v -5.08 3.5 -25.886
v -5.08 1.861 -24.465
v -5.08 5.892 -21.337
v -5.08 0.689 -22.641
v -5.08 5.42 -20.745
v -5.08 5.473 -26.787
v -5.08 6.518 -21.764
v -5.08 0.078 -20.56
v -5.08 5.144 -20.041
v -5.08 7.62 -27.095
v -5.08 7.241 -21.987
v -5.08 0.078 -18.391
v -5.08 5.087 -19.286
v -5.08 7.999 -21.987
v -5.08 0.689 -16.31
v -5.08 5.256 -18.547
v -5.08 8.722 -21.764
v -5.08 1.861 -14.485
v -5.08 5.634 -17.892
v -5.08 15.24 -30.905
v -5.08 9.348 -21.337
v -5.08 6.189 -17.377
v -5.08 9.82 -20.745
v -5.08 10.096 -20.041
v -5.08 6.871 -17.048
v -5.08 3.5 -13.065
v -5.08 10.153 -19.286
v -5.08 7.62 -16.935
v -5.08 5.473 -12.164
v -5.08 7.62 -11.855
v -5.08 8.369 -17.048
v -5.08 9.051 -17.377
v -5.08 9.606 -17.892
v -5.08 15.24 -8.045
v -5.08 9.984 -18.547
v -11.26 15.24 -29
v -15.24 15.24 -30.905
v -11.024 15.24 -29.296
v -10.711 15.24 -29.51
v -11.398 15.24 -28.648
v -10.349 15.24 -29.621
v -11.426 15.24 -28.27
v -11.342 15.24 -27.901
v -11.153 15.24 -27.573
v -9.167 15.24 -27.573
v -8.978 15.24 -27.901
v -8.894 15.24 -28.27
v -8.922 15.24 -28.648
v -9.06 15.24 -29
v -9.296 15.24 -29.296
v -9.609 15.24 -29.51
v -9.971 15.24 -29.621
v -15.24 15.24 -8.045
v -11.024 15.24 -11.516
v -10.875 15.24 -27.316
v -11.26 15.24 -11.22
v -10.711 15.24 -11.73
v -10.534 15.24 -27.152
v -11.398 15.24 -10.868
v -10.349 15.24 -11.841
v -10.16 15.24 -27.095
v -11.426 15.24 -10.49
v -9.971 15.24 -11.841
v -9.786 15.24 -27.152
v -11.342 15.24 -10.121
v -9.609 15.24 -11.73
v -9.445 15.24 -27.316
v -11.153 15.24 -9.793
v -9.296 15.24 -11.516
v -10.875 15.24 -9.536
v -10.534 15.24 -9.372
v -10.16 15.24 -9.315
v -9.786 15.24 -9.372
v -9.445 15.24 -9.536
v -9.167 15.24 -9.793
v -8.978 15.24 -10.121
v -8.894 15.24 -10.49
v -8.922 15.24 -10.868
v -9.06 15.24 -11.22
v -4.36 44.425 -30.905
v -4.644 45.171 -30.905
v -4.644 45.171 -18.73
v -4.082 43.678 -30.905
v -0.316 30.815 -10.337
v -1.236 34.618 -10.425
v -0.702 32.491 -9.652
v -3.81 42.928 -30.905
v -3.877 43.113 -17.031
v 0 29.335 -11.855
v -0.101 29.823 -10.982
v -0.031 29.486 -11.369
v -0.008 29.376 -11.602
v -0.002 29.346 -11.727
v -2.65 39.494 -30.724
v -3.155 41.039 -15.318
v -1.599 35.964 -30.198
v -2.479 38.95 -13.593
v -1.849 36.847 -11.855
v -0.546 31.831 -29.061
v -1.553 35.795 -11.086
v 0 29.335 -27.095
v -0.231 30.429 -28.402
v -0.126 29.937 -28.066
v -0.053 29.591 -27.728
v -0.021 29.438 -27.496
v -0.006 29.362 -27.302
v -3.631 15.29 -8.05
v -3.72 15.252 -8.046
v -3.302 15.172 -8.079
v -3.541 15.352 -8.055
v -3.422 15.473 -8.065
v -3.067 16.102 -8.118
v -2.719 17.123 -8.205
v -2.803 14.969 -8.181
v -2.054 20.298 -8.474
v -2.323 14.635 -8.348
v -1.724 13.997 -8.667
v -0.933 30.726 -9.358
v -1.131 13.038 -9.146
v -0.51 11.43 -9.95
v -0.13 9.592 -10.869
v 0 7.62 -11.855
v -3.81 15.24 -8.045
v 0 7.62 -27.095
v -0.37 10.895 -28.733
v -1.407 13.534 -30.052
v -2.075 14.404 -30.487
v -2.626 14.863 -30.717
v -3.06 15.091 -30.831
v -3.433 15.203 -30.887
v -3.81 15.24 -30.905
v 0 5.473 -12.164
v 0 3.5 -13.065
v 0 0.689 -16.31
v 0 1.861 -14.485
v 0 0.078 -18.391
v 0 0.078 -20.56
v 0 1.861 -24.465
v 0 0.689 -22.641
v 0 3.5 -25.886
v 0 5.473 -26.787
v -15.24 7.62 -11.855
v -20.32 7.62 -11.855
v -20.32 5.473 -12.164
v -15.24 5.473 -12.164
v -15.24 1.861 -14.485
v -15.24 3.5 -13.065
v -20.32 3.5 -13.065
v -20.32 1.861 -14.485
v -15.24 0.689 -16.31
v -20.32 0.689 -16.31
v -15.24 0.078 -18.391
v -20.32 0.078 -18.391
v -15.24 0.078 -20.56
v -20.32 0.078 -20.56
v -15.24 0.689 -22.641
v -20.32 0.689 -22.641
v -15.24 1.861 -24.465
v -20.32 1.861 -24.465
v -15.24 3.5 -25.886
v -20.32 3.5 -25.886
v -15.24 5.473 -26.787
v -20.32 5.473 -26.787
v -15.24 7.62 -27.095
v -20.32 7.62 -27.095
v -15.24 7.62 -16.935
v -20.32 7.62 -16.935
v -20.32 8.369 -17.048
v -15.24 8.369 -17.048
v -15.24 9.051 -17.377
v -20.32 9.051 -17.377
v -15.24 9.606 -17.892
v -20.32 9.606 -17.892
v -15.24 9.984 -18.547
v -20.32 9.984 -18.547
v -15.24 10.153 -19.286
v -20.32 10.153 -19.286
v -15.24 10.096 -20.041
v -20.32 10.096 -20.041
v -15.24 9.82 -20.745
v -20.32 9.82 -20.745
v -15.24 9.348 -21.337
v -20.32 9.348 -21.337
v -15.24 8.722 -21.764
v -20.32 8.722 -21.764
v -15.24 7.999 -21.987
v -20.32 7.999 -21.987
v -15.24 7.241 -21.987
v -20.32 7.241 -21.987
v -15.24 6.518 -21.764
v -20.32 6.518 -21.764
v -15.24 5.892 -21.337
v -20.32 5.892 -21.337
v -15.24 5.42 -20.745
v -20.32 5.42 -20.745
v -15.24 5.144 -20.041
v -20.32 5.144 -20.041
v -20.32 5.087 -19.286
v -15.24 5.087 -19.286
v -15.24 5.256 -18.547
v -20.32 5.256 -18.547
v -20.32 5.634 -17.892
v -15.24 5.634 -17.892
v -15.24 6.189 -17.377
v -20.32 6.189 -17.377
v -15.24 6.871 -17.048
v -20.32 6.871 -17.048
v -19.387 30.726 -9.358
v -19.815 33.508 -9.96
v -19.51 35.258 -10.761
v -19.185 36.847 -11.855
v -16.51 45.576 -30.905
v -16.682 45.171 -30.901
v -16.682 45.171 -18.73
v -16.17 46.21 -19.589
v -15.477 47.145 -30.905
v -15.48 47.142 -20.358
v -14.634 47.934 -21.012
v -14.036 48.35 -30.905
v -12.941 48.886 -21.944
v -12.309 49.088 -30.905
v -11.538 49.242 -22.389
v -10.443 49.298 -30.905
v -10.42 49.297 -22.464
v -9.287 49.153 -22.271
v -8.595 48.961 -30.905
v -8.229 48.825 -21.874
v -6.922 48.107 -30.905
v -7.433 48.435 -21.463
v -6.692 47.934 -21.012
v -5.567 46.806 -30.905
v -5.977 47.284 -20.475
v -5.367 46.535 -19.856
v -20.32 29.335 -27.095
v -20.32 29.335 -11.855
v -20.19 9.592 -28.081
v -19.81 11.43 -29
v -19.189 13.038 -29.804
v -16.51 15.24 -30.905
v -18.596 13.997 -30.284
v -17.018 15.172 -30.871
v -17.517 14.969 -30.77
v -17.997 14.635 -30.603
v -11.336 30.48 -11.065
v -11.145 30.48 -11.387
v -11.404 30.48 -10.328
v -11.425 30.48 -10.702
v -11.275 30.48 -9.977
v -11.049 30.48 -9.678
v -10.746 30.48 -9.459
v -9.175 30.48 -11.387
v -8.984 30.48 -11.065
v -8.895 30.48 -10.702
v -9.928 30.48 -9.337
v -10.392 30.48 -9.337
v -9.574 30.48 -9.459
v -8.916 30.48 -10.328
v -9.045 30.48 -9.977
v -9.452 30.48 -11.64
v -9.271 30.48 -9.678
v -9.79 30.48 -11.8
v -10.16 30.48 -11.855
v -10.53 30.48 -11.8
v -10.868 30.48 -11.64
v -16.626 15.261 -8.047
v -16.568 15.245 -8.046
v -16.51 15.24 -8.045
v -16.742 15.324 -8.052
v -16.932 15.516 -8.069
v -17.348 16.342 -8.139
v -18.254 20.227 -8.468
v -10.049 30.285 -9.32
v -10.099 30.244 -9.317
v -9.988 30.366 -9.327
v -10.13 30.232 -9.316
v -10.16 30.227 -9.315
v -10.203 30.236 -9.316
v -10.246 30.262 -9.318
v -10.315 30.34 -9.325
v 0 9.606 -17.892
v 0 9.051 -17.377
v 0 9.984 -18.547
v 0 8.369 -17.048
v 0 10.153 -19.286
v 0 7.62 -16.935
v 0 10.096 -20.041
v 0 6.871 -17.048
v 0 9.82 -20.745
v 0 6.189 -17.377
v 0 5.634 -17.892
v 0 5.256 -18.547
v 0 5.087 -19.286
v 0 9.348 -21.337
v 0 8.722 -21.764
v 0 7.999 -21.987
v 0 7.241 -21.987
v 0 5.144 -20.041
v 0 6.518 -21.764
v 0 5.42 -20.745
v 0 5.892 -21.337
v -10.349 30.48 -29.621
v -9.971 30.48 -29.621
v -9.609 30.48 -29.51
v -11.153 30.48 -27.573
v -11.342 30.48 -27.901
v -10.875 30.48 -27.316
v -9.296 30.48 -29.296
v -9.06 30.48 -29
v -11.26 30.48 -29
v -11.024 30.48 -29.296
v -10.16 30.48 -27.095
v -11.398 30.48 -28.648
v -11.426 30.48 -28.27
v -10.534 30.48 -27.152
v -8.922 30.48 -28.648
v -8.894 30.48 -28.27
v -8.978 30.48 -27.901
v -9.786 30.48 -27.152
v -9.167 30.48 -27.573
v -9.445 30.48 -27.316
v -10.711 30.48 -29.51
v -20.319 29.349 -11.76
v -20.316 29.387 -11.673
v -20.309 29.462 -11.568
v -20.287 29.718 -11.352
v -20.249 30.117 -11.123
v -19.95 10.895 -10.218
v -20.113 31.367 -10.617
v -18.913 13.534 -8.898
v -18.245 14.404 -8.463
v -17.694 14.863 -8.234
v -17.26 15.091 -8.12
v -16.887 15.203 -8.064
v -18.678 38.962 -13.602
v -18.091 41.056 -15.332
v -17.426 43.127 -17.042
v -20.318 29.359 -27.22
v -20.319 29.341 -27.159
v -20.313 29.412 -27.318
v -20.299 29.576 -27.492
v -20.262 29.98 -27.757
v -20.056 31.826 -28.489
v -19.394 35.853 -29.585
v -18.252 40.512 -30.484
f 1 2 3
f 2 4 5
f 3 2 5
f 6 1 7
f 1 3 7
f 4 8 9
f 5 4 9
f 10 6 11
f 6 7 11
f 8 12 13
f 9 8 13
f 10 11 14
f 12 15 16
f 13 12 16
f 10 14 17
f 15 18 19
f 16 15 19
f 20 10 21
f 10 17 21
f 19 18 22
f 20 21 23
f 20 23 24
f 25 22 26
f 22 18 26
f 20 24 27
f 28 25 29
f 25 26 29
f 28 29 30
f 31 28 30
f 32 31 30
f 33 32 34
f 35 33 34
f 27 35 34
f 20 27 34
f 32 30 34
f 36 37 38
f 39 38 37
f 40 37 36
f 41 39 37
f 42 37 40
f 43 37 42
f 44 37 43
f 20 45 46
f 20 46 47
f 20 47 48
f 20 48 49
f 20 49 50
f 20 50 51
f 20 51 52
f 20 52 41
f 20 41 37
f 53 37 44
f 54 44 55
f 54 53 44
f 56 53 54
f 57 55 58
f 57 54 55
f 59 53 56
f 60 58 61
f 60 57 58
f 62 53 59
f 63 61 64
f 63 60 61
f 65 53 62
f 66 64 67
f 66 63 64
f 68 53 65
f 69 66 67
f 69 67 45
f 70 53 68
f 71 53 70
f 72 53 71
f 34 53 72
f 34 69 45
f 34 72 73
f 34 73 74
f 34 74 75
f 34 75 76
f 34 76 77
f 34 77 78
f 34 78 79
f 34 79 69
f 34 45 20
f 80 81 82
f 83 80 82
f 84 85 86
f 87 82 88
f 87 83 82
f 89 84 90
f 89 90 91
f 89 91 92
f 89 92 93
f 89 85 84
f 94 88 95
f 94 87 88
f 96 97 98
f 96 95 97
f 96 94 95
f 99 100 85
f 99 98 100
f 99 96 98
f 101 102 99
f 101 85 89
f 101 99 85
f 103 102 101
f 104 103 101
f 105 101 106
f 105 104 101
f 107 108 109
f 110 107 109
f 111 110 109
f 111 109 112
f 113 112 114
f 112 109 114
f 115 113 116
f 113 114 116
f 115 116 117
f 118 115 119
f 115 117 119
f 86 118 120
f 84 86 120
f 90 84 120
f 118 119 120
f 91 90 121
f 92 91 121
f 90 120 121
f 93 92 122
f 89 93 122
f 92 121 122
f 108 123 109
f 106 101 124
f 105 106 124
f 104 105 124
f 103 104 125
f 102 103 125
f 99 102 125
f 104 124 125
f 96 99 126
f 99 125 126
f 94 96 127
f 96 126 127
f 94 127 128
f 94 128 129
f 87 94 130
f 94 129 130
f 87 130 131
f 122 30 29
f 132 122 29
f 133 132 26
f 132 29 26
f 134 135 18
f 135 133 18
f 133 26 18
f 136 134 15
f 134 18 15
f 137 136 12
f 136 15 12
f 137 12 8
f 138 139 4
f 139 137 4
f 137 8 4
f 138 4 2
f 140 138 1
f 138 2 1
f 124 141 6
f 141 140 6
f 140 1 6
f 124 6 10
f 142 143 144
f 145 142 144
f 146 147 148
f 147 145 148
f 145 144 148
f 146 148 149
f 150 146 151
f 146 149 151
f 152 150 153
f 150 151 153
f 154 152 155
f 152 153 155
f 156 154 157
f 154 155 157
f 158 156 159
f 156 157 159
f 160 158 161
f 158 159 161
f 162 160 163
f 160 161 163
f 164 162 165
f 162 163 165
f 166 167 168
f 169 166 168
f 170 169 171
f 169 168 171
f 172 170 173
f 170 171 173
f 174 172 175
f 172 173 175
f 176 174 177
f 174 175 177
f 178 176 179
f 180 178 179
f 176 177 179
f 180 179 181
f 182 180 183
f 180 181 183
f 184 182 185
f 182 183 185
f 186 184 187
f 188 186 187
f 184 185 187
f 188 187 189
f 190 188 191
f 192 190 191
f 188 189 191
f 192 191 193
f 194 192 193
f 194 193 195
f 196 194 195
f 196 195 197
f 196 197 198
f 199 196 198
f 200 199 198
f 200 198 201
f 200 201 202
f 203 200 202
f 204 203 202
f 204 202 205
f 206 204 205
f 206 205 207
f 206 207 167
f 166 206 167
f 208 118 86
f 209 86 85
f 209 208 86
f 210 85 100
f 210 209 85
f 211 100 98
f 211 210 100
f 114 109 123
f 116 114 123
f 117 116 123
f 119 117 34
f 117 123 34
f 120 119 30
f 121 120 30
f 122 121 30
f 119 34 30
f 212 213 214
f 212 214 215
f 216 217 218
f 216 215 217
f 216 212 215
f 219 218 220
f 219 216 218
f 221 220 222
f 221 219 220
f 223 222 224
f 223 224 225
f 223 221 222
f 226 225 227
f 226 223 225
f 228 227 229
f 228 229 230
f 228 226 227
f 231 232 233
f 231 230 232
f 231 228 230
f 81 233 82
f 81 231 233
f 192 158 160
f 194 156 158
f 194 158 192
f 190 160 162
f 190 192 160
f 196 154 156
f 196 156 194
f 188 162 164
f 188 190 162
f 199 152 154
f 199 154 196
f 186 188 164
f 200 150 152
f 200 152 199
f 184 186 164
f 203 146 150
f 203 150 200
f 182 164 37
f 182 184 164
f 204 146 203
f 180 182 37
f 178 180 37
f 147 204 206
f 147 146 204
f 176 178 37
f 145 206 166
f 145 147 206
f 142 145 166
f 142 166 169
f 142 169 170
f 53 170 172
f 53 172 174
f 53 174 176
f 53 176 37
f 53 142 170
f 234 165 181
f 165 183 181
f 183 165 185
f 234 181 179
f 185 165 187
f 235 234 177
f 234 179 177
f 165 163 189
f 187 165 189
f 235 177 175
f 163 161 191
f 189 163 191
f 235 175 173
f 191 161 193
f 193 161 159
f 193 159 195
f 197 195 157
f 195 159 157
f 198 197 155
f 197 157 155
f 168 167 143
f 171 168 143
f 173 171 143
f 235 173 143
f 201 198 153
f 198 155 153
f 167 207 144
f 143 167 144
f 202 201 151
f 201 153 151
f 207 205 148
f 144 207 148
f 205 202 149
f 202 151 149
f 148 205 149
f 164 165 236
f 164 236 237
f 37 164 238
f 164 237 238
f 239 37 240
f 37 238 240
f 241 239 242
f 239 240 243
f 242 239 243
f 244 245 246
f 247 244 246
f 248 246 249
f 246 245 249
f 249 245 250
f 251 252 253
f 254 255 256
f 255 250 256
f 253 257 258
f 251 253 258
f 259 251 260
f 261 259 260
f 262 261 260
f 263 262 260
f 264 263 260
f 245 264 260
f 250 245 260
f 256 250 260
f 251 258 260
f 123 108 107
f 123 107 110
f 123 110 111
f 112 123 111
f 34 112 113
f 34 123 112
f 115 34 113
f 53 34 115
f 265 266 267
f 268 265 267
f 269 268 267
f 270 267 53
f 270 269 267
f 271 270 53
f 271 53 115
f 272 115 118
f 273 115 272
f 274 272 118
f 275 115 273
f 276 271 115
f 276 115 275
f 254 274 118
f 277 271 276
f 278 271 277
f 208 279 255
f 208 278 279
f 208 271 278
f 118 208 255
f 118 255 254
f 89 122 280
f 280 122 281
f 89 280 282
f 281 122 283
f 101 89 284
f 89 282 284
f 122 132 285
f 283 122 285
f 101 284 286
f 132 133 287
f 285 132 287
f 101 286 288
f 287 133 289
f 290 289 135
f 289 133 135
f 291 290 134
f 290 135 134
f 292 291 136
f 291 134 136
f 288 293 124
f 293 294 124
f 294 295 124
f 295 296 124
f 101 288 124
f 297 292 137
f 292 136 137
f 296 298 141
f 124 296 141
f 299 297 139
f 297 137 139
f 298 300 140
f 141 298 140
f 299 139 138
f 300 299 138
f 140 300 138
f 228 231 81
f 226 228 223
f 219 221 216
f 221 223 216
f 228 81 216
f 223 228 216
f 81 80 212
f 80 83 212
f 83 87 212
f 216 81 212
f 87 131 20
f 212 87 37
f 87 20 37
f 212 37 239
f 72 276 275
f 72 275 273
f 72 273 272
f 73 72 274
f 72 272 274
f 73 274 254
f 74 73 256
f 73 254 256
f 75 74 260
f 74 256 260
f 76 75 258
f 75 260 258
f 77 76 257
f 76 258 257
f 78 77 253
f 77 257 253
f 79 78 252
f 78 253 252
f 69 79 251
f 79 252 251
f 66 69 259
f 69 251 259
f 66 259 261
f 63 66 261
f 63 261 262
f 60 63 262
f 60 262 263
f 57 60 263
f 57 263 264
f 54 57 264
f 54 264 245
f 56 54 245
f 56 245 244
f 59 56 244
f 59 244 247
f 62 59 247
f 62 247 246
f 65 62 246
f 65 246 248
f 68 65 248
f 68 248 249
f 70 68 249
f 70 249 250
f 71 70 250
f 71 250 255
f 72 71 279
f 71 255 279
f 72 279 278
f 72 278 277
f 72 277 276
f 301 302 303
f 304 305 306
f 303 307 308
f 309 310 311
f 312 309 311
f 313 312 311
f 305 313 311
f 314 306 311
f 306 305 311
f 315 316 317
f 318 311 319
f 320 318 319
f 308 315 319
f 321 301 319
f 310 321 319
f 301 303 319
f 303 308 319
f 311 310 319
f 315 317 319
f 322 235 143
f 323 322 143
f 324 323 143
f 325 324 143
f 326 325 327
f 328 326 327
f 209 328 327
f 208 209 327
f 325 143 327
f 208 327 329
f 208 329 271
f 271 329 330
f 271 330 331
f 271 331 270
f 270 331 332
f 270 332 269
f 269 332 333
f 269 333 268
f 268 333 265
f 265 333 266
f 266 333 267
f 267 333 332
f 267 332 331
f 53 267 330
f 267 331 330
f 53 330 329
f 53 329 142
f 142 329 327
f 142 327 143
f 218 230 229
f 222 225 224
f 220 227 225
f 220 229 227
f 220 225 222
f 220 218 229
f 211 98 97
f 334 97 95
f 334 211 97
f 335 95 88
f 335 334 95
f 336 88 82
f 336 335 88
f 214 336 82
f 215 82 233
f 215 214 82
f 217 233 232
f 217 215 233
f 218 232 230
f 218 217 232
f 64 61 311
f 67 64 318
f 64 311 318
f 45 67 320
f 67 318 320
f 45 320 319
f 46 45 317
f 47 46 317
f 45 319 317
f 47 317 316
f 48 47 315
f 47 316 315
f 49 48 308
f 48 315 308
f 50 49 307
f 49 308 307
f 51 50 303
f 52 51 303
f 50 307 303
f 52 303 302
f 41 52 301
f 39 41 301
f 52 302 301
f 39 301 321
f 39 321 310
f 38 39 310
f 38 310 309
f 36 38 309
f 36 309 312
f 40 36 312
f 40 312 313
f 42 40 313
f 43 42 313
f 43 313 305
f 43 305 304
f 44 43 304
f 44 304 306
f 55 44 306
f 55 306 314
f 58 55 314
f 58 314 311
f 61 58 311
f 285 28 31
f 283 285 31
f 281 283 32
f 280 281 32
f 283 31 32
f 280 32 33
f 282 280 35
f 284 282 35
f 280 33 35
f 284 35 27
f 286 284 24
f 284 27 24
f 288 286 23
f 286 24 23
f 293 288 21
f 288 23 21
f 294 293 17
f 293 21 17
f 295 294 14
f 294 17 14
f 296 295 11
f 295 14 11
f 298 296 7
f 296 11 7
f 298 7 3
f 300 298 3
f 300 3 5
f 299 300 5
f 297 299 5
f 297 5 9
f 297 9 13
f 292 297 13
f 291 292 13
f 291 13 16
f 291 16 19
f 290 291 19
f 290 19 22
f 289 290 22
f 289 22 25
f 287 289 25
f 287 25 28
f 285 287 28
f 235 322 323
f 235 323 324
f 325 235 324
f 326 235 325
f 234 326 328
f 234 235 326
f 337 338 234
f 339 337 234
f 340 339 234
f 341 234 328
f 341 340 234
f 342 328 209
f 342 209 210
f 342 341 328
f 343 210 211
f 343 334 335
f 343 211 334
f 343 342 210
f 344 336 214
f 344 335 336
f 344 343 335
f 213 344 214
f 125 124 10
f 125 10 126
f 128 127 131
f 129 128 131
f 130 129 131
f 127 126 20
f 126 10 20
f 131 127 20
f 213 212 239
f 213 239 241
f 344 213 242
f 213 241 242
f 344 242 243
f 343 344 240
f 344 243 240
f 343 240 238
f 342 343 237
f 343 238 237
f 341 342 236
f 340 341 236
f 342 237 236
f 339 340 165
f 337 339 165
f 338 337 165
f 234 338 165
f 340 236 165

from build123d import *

# Parameters (mm, degrees)
BOSS_EXTRUDE1_DEPTH = 50.8
CUT_EXTRUDE2_START  = -20.32
SKETCH3_R           = 1.27
CUT_EXTRUDE2_DEPTH  = 50.8
CUT_EXTRUDE1_DEPTH  = 50.8
SKETCH4_W           = 10.16
SKETCH4_H           = 15.24
CUT_EXTRUDE3_DEPTH  = 50.8
SKETCH5_R           = 2.54
CUT_EXTRUDE5_DEPTH  = 50.8
CUT_EXTRUDE6_DEPTH  = 32.512
CUT_EXTRUDE7_DEPTH  = 32.512


with BuildPart() as part:
    # Sketch1 → Boss-Extrude1 (new body)
    with BuildSketch(Plane(origin=(0, 0, 0), x_dir=(1, 0, 0), z_dir=(0, 1, 0))):
        with BuildLine():
            Line((-20.32, 27.095319289), (-20.32, 11.855319289))
            ThreePointArc((-20.32, 11.855319289), (-19.204076836, 9.161242453), (-16.51, 8.045319289))
            Line((-16.51, 8.045319289), (-3.81, 8.045319289))
            ThreePointArc((-3.81, 8.045319289), (-1.115923164, 9.161242453), (0, 11.855319289))
            Line((0, 11.855319289), (0, 27.095319289))
            ThreePointArc((0, 27.095319289), (-1.115923164, 29.789396126), (-3.81, 30.905319289))
            Line((-3.81, 30.905319289), (-16.51, 30.905319289))
            ThreePointArc((-16.51, 30.905319289), (-19.204076836, 29.789396126), (-20.32, 27.095319289))
        make_face()
    extrude(amount=BOSS_EXTRUDE1_DEPTH)

    # Sketch3 → Cut-Extrude2 (cut)
    with BuildSketch(Plane(origin=(0, 50.8, 0), x_dir=(1, 0, 0), z_dir=(0, 1, 0)).offset(CUT_EXTRUDE2_START)):
        with Locations(Location((-10.16, 10.585319289, 0), (0, 0, 270))):
            Circle(SKETCH3_R)
        with Locations(Location((-10.16, 28.365319289, 0), (0, 0, 270))):
            Circle(SKETCH3_R)
    extrude(amount=-CUT_EXTRUDE2_DEPTH, mode=Mode.SUBTRACT)

    # Sketch2 → Cut-Extrude1 (cut)
    with BuildSketch(Plane.ZY.offset(20.32)):
        with BuildLine():
            Line((-27.095319289, 7.62), (-30.905319289, 15.24))
            Line((-30.905319289, 15.24), (-30.905319289, -5.08))
            Line((-30.905319289, -5.08), (-8.045319289, -5.08))
            Line((-8.045319289, -5.08), (-8.045319289, 15.24))
            Line((-8.045319289, 15.24), (-11.855319289, 7.62))
            ThreePointArc((-11.855319289, 7.62), (-19.475319289, 0), (-27.095319289, 7.62))
        make_face()
    extrude(amount=-CUT_EXTRUDE1_DEPTH, mode=Mode.SUBTRACT)

    # Sketch4 → Cut-Extrude3 (cut)
    with BuildSketch(Plane.XY.offset(-8.045319289)):
        with Locations((-10.16, 7.62)):
            Rectangle(SKETCH4_W, SKETCH4_H)
    extrude(amount=-CUT_EXTRUDE3_DEPTH, mode=Mode.SUBTRACT)

    # Sketch5 → Cut-Extrude5 (cut)
    with BuildSketch(Plane.ZY.offset(20.32)):
        with Locations((-19.475319289, 7.62)):
            Circle(SKETCH5_R)
    extrude(amount=-CUT_EXTRUDE5_DEPTH, mode=Mode.SUBTRACT)

    # Sketch6 → Cut-Extrude6 (cut)
    with BuildSketch(Plane.ZY.offset(20.32)):
        with BuildLine():
            Line((-11.855319289, 36.846817341), (-21.012334943, 47.93447962))
            ThreePointArc((-21.012334943, 47.93447962), (-23.733254983, 50.047756788), (-27.095319289, 50.8))
            Line((-27.095319289, 50.8), (-31.52544936, 50.8))
            Line((-31.52544936, 50.8), (-31.52544936, 15.08846866))
            Line((-31.52544936, 15.08846866), (-40.392656277, 51.934271372))
            Line((-40.392656277, 51.934271372), (12.273740193, 71.26134954))
            Line((12.273740193, 71.26134954), (-8.045319289, 15.24))
            Line((-8.045319289, 15.24), (-9.357524517, 30.725540243))
            ThreePointArc((-9.357524517, 30.725540243), (-10.139323425, 33.97677891), (-11.855319289, 36.846817341))
        make_face()
    extrude(amount=-CUT_EXTRUDE6_DEPTH, mode=Mode.SUBTRACT)

    # Sketch7 → Cut-Extrude7 (cut)
    with BuildSketch(Plane(origin=(0, 0, -30.905319289), x_dir=(-1, 0, 0), z_dir=(0, 0, -1))):
        with BuildLine():
            Line((0, 29.335182296), (-12.852337187, 67.804770192))
            Line((-12.852337187, 67.804770192), (37.594938904, 66.861563092))
            Line((37.594938904, 66.861563092), (20.32, 29.335182296))
            ThreePointArc((20.32, 29.335182296), (19.06442366, 37.382371637), (16.68228589, 45.170769925))
            ThreePointArc((16.68228589, 45.170769925), (10.662952429, 49.301878805), (4.643618968, 45.170769925))
            ThreePointArc((4.643618968, 45.170769925), (1.994617848, 37.348921605), (0, 29.335182296))
        make_face()
    extrude(amount=-CUT_EXTRUDE7_DEPTH, mode=Mode.SUBTRACT)


solid = part.part
